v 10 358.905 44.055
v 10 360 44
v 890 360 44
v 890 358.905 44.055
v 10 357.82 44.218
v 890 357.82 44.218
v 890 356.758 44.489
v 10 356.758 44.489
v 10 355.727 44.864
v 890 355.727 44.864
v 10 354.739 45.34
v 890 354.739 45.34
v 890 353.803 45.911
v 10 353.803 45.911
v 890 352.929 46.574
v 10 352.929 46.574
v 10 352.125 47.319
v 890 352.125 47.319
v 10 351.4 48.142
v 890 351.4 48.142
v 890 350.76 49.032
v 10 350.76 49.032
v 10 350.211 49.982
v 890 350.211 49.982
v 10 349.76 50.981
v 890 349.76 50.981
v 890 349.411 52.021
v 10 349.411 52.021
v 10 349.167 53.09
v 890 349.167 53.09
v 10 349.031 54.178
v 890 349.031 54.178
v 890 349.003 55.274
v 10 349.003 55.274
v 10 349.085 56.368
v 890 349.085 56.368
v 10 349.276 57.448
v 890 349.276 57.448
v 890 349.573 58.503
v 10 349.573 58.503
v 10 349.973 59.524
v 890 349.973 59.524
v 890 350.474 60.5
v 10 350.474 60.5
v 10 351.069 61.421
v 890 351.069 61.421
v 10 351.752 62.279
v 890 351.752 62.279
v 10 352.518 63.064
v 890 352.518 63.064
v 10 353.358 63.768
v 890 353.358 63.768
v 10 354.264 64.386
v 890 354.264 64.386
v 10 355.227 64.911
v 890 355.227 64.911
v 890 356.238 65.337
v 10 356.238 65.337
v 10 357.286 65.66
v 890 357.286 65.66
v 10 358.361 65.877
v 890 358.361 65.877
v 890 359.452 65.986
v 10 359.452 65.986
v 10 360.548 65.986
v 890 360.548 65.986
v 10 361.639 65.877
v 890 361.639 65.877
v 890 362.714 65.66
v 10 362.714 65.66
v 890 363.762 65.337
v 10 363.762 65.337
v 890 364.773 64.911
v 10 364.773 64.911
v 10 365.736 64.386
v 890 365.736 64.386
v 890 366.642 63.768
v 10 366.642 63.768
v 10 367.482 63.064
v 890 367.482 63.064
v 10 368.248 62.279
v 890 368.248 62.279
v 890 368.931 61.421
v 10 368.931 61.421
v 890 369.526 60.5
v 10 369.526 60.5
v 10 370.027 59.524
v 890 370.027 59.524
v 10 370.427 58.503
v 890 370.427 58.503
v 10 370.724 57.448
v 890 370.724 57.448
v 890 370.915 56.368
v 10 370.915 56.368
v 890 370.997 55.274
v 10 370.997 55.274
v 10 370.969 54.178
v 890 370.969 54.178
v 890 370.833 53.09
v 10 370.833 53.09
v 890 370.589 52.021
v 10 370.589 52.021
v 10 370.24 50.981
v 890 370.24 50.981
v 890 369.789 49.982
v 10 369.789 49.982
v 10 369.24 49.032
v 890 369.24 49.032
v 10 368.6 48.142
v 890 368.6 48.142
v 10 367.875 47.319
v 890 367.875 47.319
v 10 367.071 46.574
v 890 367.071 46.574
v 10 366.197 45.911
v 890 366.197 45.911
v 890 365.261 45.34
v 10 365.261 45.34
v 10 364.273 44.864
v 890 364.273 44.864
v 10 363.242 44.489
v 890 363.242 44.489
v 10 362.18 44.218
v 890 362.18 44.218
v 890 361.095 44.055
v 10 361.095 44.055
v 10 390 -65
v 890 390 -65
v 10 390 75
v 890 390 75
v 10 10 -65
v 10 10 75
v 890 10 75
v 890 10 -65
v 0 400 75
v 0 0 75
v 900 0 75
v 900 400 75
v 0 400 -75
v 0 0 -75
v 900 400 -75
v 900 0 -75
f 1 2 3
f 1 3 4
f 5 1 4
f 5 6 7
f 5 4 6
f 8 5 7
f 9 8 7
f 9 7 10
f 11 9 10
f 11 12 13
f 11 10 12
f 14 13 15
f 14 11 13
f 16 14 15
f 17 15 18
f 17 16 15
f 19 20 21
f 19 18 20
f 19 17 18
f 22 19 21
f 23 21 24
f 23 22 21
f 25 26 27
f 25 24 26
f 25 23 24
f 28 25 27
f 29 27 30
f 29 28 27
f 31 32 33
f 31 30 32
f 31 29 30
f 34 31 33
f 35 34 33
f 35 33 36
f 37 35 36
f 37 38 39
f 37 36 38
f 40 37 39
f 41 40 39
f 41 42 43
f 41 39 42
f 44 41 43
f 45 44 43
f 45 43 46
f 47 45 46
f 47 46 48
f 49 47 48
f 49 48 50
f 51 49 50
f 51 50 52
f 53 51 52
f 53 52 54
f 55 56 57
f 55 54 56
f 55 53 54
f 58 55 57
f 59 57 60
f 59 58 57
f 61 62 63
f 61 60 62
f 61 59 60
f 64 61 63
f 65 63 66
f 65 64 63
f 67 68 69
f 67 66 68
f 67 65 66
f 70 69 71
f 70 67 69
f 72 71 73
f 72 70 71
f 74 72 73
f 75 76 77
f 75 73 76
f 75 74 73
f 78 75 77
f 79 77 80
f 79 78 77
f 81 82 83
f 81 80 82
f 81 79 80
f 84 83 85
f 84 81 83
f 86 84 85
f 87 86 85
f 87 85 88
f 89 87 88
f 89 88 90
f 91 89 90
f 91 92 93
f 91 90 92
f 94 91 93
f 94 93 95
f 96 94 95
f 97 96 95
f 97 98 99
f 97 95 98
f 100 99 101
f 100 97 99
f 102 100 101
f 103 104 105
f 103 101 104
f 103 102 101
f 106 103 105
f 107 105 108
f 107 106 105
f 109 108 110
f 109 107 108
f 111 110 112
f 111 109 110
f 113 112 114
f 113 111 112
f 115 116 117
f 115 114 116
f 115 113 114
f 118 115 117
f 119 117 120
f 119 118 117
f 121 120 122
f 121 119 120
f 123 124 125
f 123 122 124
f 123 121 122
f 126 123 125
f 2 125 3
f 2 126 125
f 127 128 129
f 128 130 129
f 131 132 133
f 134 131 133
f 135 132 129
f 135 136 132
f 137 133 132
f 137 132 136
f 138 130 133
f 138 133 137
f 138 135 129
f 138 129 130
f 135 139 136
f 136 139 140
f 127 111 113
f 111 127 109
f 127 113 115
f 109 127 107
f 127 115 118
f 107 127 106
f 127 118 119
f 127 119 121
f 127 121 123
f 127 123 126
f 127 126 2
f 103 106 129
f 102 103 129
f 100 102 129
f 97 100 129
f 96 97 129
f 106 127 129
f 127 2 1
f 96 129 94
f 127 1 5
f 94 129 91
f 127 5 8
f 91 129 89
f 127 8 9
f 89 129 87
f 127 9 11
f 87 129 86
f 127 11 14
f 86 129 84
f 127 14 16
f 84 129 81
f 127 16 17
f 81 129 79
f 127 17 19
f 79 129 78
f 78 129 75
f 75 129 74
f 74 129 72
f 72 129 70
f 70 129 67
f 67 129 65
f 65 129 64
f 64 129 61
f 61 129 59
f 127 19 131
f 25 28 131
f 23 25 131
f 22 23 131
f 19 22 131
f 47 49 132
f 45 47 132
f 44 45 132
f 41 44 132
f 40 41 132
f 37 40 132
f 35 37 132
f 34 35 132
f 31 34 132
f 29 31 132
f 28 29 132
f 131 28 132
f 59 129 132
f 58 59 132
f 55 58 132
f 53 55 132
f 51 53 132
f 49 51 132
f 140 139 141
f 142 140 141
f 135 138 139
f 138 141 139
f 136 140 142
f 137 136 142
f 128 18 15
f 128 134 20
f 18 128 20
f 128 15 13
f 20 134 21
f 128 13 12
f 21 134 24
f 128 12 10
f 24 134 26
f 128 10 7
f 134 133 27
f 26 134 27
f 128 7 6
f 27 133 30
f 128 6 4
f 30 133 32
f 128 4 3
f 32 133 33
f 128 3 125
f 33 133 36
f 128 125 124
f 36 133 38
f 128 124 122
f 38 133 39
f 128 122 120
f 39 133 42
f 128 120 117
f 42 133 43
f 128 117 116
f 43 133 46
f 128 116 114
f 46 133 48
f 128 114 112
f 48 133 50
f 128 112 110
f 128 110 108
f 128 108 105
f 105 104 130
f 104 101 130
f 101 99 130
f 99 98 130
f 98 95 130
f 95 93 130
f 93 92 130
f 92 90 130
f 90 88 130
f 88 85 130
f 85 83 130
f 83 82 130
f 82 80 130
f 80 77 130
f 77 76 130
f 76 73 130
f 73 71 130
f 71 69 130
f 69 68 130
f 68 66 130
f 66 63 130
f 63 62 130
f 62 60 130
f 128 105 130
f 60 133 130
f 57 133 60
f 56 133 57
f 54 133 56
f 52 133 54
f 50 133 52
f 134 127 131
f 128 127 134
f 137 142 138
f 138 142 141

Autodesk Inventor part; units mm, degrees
ref_plane "YZ Plane" through (0, 0, 0) normal (1, 0, 0) x (0, 1, 0)
ref_plane "XZ Plane" through (0, 0, 0) normal (0, 1, 0) x (-1, 0, 0)
ref_plane "XY Plane" through (0, 0, 0) normal (0, 0, 1) x (1, 0, 0)
sketch "스케치1" plane through (0, 0, 0) normal (0, 0, 1) x (1, 0, 0)
  line L0 (0, 0) -> (900, 0)
  line L1 (900, 0) -> (900, 400)
  line L2 (900, 400) -> (0, 400)
  line L3 (0, 400) -> (0, 0)
  dimension "d2" = 900
  dimension "d3" = 400
extrude "돌출1" add sketch "스케치1" along normal mid plane 150
sketch "스케치2" plane through (0, 0, 75) normal (0, 0, 1) x (1, 0, 0)
  line L0 (10, 10) -> (890, 10)
  line L1 (890, 10) -> (890, 390)
  line L2 (890, 390) -> (10, 390)
  line L3 (10, 390) -> (10, 10)
  line L4 (0, 400) -> (0, 0) projected
  line L5 (900, 400) -> (0, 400) projected
  line L6 (900, 0) -> (900, 400) projected
  line L7 (900, 0) -> (0, 0) projected
  point P0 (0, 200)
  point P1 (10, 200)
  dimension "d6" = 10
  dimension "d7" = 10
  dimension "d8" = 10
  dimension "d10" = 10
extrude "돌출2" cut sketch "스케치2" against normal blind 140 contours L3 L2 L1 L0
sketch "스케치3" plane through (10, 10, 75) normal (1, 0, 0) x (0, 0, -1)
  circle A0 centre (20, 350) radius 11
  line L0 (150, 390) -> (0, 390) projected
  line L1 (0, 390) -> (0, -10) projected
  point P0 (75, -10)
  dimension "d13" = 40
  dimension "d14" = 20
  dimension "d15" = 22
extrude "돌출3" add sketch "스케치3" along normal blind 880
properties part number "상자구상도"
